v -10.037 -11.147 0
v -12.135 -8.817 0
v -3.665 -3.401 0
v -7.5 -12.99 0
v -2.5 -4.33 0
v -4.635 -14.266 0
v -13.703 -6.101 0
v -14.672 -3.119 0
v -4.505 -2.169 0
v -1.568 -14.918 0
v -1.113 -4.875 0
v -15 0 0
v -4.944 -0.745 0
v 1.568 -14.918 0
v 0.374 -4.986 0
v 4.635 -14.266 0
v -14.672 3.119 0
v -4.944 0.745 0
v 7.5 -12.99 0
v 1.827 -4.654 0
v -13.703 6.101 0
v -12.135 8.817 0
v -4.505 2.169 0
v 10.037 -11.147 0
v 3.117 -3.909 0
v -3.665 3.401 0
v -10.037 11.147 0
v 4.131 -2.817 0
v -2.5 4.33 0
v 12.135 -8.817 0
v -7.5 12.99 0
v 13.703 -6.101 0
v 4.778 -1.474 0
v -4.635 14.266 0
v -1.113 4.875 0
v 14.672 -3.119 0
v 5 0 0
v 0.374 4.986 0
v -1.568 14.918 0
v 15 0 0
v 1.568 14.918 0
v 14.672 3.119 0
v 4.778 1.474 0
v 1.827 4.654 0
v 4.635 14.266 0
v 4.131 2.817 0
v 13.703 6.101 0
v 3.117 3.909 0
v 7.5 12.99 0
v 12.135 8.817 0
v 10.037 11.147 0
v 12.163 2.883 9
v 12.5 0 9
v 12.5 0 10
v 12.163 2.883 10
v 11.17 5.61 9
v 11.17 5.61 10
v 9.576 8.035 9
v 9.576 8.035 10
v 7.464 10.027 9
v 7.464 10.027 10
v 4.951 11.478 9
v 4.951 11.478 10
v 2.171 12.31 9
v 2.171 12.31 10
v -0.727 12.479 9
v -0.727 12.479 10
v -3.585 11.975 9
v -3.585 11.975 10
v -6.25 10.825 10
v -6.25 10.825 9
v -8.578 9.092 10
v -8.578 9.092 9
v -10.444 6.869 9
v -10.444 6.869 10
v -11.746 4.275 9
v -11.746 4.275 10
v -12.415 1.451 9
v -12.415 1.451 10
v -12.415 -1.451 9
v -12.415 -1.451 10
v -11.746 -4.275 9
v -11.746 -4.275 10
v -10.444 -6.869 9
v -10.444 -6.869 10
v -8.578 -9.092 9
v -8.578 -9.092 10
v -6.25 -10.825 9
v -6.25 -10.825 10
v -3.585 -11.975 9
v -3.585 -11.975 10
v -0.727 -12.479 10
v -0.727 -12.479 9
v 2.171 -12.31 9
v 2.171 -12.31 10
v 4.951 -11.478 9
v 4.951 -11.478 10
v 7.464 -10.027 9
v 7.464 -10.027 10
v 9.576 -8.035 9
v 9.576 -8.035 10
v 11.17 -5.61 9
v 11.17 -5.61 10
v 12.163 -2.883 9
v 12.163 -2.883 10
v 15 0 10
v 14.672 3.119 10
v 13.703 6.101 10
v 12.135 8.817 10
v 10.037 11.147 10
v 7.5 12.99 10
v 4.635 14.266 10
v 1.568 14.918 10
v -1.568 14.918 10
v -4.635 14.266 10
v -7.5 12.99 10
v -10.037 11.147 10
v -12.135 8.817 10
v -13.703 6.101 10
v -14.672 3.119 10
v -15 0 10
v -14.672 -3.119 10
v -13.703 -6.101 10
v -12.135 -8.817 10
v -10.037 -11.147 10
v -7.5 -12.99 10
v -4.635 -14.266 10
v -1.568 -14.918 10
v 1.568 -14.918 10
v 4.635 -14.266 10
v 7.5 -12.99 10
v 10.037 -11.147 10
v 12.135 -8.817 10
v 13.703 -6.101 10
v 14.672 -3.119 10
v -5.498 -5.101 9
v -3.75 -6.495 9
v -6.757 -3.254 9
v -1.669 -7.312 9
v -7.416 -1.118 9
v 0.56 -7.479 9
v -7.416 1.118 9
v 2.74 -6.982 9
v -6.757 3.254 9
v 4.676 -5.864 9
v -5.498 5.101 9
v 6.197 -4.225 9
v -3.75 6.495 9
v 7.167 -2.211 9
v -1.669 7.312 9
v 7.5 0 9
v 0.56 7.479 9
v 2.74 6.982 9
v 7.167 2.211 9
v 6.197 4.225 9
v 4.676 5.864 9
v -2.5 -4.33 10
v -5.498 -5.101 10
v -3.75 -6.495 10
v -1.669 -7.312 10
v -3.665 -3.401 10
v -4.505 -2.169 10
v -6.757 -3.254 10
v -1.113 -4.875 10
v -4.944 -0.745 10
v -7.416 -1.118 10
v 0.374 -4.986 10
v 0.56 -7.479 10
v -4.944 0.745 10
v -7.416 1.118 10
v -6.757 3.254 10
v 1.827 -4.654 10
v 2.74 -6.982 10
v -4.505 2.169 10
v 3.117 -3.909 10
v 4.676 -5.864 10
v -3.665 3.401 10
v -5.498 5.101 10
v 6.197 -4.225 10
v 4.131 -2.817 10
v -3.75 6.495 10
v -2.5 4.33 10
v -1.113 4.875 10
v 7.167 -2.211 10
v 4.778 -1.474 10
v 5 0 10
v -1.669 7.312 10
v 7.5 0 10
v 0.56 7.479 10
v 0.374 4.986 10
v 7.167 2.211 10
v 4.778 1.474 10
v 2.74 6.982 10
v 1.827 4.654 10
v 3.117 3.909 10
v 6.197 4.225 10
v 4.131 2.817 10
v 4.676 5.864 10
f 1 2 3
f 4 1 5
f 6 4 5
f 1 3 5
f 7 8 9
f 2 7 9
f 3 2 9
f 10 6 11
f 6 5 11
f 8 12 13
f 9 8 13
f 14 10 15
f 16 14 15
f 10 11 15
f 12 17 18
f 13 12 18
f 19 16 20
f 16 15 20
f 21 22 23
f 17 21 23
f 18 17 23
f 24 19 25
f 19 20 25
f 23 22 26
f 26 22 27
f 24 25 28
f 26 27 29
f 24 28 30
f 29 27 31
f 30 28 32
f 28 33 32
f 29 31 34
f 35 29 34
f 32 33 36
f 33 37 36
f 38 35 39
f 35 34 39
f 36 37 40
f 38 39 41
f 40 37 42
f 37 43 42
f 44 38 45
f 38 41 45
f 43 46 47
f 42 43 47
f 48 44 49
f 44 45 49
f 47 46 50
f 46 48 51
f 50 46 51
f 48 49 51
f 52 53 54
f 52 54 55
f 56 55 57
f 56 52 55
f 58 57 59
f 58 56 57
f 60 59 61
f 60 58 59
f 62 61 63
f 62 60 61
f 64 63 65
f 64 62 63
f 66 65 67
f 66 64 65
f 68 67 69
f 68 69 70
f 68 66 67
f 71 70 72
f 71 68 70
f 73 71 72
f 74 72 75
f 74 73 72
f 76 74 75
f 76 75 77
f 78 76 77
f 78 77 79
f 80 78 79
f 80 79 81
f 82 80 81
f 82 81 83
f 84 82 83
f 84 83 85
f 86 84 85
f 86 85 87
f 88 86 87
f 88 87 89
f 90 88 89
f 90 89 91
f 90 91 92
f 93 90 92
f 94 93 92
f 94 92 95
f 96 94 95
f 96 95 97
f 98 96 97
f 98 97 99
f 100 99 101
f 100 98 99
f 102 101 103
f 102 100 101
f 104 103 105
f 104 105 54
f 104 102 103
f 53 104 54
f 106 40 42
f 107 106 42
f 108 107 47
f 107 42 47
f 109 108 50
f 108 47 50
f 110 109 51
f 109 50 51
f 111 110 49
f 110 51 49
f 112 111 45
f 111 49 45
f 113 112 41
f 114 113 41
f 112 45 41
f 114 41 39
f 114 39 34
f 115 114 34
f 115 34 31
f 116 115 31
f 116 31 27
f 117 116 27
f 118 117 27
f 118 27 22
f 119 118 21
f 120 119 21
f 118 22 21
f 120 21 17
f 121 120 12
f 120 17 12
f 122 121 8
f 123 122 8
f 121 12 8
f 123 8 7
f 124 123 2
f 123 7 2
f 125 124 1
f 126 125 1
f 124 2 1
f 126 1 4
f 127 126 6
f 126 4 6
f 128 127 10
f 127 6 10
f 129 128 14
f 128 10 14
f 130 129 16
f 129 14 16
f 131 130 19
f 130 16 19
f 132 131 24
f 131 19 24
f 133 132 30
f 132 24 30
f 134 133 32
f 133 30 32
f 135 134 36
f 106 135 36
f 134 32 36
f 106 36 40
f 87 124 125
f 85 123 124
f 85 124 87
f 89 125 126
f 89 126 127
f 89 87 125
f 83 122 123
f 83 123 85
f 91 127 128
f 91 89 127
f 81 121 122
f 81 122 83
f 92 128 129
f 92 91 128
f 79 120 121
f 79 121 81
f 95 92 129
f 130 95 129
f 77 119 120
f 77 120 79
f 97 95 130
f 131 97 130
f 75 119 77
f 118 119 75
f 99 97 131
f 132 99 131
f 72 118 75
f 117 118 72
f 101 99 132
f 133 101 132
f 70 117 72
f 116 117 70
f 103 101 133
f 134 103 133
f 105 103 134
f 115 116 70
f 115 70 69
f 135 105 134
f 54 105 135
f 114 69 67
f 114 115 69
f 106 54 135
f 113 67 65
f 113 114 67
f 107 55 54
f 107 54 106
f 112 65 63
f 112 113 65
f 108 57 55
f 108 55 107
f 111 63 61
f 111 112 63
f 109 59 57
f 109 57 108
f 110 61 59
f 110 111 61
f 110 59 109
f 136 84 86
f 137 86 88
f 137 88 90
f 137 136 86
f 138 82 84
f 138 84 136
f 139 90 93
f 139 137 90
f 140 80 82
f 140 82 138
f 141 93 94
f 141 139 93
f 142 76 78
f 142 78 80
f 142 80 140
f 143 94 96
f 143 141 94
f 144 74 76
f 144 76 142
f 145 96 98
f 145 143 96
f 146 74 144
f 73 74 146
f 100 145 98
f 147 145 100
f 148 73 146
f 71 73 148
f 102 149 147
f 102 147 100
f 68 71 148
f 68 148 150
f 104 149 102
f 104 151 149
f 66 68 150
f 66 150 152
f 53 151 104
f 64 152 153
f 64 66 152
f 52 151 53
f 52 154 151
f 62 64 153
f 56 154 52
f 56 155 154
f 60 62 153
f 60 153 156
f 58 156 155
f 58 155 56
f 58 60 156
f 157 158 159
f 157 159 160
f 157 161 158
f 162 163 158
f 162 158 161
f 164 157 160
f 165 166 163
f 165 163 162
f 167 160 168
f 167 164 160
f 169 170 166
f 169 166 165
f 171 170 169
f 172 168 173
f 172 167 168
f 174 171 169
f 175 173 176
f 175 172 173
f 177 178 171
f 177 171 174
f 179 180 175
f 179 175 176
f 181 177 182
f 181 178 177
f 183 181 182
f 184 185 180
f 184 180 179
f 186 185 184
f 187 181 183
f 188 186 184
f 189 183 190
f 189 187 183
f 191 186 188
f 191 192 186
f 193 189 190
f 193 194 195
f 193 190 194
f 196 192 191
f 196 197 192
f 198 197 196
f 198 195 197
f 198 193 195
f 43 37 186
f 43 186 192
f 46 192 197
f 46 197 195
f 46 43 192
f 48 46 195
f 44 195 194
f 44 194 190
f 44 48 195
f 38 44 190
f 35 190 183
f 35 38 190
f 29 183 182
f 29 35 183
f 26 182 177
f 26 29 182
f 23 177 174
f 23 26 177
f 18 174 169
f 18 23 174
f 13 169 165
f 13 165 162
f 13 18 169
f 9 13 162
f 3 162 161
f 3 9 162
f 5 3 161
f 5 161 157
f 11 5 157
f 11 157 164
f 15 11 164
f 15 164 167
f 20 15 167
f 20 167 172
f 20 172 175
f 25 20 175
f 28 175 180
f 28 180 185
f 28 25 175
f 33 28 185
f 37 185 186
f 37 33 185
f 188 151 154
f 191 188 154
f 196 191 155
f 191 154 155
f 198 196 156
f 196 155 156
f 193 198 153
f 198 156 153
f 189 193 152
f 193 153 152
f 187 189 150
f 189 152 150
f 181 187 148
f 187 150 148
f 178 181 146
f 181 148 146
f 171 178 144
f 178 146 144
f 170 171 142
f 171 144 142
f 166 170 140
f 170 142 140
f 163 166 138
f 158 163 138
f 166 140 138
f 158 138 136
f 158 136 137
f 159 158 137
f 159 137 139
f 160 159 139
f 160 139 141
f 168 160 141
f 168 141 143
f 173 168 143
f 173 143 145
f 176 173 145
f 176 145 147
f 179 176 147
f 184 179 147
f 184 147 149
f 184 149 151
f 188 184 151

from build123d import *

# Parameters (mm, degrees)
SKETCH2_R             = 7.5
SKETCH2_R_2           = 5
BOSS_EXTRUDE1_DEPTH   = 10
SKETCH2_R_3           = 15
SKETCH2_R_4           = 12.5
BOSS_EXTRUDE1_2_DEPTH = 10
SKETCH2_3_R           = 12.5
SKETCH2_3_R_2         = 7.5
BOSS_EXTRUDE2_DEPTH   = 9


with BuildPart() as part:
    # Sketch2 → Boss-Extrude1 (new body)
    with BuildSketch(Plane.XY):
        Circle(SKETCH2_R)
        Circle(SKETCH2_R_2, mode=Mode.SUBTRACT)
    extrude(amount=BOSS_EXTRUDE1_DEPTH)



with BuildPart() as body_2:
    # Sketch2 → Boss-Extrude1 2 (new body)
    with BuildSketch(Plane.XY):
        Circle(SKETCH2_R_3)
        Circle(SKETCH2_R_4, mode=Mode.SUBTRACT)
    extrude(amount=BOSS_EXTRUDE1_2_DEPTH)


with BuildPart() as part_1:
    add(part.part)

    add(body_2.part)  # Boss-Extrude2 merges body 2
    # Sketch2<3> → Boss-Extrude2 (add)
    with BuildSketch(Plane.XY):
        Circle(SKETCH2_3_R)
        Circle(SKETCH2_3_R_2, mode=Mode.SUBTRACT)
    extrude(amount=BOSS_EXTRUDE2_DEPTH)


solid = part_1.part
